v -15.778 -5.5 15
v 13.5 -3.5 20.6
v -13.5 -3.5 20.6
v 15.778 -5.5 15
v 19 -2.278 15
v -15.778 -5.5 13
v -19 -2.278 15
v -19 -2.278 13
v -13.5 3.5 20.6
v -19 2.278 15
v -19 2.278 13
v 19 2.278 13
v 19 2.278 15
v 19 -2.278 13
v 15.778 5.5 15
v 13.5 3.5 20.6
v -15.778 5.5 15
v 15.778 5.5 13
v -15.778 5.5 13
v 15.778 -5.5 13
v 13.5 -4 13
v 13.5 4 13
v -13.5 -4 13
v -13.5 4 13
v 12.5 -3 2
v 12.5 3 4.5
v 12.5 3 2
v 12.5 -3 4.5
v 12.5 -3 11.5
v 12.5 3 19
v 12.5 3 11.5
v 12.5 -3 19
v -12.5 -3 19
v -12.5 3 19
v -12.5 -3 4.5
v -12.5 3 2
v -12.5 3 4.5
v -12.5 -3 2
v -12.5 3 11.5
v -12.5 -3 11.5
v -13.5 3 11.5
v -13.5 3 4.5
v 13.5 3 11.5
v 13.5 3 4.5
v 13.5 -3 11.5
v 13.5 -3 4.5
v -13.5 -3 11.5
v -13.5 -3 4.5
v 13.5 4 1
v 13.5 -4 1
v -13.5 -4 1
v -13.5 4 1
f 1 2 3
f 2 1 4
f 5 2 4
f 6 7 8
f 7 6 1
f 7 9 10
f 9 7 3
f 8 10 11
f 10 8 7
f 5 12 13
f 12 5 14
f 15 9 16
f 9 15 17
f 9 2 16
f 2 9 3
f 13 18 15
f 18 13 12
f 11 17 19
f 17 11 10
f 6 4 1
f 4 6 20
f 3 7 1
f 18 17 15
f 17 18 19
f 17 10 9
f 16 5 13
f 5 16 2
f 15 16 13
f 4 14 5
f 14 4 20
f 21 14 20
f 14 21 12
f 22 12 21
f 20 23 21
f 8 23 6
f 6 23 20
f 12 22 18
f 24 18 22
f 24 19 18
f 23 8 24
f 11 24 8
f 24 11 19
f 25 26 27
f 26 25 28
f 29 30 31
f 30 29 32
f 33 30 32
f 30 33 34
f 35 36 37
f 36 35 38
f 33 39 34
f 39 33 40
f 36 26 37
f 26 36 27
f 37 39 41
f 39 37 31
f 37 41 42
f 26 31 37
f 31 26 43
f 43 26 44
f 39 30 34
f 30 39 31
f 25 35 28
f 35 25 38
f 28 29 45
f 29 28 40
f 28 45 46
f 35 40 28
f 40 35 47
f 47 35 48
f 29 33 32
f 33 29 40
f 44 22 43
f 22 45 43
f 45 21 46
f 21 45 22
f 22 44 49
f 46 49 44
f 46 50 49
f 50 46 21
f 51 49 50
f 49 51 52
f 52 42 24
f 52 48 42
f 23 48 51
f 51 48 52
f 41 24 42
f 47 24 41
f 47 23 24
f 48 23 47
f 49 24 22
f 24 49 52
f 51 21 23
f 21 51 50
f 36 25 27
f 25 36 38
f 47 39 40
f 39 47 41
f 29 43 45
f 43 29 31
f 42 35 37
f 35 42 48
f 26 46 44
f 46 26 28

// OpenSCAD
notch_mating_gap = 0.0;

notch_rim_radius = 5.5 + notch_mating_gap;
notch_rim_height = 2 + notch_mating_gap;

notch_tip_length = 27 + notch_mating_gap;
notch_tip_width = 7 + notch_mating_gap;
notch_tip_height = 7.6 + notch_mating_gap;

magnet_length = 25;
magnet_width = 6;
magnet_hight = magnet_width;

module magnet(){
    cube([magnet_length,magnet_width,magnet_hight],center = true);
}

module atachment_notch() {
  hull(){
    translate([notch_tip_length/2, 0, notch_rim_height/2]) rotate([0, 0, 360/16])
      cylinder(h = notch_rim_height, r = notch_rim_radius / cos(360/16), $fn = 8, center = true);
    translate([notch_tip_length/-2, 0, notch_rim_height/2]) rotate([0, 0, 360/16])
      cylinder(h = notch_rim_height, r = notch_rim_radius / cos(360/16), $fn = 8, center = true);
    translate([0, 0, notch_tip_height/2])
      cube([notch_tip_length, notch_tip_width, notch_tip_height], center = true);
  }
}
translate([0,0,magnet_hight * 2 + 1]){


difference(){
atachment_notch();

translate([0,0,magnet_hight/2])
magnet();
}

}

difference(){

translate([0,-0,7])
cube([magnet_length+2,magnet_width+2,magnet_hight*2],center = true);

translate([0,-0,8])
cube([magnet_length,magnet_width,magnet_hight*2],center = true);
    
translate([0,-0,8])
cube([magnet_length+6,magnet_width,magnet_hight+1],center = true);
}
